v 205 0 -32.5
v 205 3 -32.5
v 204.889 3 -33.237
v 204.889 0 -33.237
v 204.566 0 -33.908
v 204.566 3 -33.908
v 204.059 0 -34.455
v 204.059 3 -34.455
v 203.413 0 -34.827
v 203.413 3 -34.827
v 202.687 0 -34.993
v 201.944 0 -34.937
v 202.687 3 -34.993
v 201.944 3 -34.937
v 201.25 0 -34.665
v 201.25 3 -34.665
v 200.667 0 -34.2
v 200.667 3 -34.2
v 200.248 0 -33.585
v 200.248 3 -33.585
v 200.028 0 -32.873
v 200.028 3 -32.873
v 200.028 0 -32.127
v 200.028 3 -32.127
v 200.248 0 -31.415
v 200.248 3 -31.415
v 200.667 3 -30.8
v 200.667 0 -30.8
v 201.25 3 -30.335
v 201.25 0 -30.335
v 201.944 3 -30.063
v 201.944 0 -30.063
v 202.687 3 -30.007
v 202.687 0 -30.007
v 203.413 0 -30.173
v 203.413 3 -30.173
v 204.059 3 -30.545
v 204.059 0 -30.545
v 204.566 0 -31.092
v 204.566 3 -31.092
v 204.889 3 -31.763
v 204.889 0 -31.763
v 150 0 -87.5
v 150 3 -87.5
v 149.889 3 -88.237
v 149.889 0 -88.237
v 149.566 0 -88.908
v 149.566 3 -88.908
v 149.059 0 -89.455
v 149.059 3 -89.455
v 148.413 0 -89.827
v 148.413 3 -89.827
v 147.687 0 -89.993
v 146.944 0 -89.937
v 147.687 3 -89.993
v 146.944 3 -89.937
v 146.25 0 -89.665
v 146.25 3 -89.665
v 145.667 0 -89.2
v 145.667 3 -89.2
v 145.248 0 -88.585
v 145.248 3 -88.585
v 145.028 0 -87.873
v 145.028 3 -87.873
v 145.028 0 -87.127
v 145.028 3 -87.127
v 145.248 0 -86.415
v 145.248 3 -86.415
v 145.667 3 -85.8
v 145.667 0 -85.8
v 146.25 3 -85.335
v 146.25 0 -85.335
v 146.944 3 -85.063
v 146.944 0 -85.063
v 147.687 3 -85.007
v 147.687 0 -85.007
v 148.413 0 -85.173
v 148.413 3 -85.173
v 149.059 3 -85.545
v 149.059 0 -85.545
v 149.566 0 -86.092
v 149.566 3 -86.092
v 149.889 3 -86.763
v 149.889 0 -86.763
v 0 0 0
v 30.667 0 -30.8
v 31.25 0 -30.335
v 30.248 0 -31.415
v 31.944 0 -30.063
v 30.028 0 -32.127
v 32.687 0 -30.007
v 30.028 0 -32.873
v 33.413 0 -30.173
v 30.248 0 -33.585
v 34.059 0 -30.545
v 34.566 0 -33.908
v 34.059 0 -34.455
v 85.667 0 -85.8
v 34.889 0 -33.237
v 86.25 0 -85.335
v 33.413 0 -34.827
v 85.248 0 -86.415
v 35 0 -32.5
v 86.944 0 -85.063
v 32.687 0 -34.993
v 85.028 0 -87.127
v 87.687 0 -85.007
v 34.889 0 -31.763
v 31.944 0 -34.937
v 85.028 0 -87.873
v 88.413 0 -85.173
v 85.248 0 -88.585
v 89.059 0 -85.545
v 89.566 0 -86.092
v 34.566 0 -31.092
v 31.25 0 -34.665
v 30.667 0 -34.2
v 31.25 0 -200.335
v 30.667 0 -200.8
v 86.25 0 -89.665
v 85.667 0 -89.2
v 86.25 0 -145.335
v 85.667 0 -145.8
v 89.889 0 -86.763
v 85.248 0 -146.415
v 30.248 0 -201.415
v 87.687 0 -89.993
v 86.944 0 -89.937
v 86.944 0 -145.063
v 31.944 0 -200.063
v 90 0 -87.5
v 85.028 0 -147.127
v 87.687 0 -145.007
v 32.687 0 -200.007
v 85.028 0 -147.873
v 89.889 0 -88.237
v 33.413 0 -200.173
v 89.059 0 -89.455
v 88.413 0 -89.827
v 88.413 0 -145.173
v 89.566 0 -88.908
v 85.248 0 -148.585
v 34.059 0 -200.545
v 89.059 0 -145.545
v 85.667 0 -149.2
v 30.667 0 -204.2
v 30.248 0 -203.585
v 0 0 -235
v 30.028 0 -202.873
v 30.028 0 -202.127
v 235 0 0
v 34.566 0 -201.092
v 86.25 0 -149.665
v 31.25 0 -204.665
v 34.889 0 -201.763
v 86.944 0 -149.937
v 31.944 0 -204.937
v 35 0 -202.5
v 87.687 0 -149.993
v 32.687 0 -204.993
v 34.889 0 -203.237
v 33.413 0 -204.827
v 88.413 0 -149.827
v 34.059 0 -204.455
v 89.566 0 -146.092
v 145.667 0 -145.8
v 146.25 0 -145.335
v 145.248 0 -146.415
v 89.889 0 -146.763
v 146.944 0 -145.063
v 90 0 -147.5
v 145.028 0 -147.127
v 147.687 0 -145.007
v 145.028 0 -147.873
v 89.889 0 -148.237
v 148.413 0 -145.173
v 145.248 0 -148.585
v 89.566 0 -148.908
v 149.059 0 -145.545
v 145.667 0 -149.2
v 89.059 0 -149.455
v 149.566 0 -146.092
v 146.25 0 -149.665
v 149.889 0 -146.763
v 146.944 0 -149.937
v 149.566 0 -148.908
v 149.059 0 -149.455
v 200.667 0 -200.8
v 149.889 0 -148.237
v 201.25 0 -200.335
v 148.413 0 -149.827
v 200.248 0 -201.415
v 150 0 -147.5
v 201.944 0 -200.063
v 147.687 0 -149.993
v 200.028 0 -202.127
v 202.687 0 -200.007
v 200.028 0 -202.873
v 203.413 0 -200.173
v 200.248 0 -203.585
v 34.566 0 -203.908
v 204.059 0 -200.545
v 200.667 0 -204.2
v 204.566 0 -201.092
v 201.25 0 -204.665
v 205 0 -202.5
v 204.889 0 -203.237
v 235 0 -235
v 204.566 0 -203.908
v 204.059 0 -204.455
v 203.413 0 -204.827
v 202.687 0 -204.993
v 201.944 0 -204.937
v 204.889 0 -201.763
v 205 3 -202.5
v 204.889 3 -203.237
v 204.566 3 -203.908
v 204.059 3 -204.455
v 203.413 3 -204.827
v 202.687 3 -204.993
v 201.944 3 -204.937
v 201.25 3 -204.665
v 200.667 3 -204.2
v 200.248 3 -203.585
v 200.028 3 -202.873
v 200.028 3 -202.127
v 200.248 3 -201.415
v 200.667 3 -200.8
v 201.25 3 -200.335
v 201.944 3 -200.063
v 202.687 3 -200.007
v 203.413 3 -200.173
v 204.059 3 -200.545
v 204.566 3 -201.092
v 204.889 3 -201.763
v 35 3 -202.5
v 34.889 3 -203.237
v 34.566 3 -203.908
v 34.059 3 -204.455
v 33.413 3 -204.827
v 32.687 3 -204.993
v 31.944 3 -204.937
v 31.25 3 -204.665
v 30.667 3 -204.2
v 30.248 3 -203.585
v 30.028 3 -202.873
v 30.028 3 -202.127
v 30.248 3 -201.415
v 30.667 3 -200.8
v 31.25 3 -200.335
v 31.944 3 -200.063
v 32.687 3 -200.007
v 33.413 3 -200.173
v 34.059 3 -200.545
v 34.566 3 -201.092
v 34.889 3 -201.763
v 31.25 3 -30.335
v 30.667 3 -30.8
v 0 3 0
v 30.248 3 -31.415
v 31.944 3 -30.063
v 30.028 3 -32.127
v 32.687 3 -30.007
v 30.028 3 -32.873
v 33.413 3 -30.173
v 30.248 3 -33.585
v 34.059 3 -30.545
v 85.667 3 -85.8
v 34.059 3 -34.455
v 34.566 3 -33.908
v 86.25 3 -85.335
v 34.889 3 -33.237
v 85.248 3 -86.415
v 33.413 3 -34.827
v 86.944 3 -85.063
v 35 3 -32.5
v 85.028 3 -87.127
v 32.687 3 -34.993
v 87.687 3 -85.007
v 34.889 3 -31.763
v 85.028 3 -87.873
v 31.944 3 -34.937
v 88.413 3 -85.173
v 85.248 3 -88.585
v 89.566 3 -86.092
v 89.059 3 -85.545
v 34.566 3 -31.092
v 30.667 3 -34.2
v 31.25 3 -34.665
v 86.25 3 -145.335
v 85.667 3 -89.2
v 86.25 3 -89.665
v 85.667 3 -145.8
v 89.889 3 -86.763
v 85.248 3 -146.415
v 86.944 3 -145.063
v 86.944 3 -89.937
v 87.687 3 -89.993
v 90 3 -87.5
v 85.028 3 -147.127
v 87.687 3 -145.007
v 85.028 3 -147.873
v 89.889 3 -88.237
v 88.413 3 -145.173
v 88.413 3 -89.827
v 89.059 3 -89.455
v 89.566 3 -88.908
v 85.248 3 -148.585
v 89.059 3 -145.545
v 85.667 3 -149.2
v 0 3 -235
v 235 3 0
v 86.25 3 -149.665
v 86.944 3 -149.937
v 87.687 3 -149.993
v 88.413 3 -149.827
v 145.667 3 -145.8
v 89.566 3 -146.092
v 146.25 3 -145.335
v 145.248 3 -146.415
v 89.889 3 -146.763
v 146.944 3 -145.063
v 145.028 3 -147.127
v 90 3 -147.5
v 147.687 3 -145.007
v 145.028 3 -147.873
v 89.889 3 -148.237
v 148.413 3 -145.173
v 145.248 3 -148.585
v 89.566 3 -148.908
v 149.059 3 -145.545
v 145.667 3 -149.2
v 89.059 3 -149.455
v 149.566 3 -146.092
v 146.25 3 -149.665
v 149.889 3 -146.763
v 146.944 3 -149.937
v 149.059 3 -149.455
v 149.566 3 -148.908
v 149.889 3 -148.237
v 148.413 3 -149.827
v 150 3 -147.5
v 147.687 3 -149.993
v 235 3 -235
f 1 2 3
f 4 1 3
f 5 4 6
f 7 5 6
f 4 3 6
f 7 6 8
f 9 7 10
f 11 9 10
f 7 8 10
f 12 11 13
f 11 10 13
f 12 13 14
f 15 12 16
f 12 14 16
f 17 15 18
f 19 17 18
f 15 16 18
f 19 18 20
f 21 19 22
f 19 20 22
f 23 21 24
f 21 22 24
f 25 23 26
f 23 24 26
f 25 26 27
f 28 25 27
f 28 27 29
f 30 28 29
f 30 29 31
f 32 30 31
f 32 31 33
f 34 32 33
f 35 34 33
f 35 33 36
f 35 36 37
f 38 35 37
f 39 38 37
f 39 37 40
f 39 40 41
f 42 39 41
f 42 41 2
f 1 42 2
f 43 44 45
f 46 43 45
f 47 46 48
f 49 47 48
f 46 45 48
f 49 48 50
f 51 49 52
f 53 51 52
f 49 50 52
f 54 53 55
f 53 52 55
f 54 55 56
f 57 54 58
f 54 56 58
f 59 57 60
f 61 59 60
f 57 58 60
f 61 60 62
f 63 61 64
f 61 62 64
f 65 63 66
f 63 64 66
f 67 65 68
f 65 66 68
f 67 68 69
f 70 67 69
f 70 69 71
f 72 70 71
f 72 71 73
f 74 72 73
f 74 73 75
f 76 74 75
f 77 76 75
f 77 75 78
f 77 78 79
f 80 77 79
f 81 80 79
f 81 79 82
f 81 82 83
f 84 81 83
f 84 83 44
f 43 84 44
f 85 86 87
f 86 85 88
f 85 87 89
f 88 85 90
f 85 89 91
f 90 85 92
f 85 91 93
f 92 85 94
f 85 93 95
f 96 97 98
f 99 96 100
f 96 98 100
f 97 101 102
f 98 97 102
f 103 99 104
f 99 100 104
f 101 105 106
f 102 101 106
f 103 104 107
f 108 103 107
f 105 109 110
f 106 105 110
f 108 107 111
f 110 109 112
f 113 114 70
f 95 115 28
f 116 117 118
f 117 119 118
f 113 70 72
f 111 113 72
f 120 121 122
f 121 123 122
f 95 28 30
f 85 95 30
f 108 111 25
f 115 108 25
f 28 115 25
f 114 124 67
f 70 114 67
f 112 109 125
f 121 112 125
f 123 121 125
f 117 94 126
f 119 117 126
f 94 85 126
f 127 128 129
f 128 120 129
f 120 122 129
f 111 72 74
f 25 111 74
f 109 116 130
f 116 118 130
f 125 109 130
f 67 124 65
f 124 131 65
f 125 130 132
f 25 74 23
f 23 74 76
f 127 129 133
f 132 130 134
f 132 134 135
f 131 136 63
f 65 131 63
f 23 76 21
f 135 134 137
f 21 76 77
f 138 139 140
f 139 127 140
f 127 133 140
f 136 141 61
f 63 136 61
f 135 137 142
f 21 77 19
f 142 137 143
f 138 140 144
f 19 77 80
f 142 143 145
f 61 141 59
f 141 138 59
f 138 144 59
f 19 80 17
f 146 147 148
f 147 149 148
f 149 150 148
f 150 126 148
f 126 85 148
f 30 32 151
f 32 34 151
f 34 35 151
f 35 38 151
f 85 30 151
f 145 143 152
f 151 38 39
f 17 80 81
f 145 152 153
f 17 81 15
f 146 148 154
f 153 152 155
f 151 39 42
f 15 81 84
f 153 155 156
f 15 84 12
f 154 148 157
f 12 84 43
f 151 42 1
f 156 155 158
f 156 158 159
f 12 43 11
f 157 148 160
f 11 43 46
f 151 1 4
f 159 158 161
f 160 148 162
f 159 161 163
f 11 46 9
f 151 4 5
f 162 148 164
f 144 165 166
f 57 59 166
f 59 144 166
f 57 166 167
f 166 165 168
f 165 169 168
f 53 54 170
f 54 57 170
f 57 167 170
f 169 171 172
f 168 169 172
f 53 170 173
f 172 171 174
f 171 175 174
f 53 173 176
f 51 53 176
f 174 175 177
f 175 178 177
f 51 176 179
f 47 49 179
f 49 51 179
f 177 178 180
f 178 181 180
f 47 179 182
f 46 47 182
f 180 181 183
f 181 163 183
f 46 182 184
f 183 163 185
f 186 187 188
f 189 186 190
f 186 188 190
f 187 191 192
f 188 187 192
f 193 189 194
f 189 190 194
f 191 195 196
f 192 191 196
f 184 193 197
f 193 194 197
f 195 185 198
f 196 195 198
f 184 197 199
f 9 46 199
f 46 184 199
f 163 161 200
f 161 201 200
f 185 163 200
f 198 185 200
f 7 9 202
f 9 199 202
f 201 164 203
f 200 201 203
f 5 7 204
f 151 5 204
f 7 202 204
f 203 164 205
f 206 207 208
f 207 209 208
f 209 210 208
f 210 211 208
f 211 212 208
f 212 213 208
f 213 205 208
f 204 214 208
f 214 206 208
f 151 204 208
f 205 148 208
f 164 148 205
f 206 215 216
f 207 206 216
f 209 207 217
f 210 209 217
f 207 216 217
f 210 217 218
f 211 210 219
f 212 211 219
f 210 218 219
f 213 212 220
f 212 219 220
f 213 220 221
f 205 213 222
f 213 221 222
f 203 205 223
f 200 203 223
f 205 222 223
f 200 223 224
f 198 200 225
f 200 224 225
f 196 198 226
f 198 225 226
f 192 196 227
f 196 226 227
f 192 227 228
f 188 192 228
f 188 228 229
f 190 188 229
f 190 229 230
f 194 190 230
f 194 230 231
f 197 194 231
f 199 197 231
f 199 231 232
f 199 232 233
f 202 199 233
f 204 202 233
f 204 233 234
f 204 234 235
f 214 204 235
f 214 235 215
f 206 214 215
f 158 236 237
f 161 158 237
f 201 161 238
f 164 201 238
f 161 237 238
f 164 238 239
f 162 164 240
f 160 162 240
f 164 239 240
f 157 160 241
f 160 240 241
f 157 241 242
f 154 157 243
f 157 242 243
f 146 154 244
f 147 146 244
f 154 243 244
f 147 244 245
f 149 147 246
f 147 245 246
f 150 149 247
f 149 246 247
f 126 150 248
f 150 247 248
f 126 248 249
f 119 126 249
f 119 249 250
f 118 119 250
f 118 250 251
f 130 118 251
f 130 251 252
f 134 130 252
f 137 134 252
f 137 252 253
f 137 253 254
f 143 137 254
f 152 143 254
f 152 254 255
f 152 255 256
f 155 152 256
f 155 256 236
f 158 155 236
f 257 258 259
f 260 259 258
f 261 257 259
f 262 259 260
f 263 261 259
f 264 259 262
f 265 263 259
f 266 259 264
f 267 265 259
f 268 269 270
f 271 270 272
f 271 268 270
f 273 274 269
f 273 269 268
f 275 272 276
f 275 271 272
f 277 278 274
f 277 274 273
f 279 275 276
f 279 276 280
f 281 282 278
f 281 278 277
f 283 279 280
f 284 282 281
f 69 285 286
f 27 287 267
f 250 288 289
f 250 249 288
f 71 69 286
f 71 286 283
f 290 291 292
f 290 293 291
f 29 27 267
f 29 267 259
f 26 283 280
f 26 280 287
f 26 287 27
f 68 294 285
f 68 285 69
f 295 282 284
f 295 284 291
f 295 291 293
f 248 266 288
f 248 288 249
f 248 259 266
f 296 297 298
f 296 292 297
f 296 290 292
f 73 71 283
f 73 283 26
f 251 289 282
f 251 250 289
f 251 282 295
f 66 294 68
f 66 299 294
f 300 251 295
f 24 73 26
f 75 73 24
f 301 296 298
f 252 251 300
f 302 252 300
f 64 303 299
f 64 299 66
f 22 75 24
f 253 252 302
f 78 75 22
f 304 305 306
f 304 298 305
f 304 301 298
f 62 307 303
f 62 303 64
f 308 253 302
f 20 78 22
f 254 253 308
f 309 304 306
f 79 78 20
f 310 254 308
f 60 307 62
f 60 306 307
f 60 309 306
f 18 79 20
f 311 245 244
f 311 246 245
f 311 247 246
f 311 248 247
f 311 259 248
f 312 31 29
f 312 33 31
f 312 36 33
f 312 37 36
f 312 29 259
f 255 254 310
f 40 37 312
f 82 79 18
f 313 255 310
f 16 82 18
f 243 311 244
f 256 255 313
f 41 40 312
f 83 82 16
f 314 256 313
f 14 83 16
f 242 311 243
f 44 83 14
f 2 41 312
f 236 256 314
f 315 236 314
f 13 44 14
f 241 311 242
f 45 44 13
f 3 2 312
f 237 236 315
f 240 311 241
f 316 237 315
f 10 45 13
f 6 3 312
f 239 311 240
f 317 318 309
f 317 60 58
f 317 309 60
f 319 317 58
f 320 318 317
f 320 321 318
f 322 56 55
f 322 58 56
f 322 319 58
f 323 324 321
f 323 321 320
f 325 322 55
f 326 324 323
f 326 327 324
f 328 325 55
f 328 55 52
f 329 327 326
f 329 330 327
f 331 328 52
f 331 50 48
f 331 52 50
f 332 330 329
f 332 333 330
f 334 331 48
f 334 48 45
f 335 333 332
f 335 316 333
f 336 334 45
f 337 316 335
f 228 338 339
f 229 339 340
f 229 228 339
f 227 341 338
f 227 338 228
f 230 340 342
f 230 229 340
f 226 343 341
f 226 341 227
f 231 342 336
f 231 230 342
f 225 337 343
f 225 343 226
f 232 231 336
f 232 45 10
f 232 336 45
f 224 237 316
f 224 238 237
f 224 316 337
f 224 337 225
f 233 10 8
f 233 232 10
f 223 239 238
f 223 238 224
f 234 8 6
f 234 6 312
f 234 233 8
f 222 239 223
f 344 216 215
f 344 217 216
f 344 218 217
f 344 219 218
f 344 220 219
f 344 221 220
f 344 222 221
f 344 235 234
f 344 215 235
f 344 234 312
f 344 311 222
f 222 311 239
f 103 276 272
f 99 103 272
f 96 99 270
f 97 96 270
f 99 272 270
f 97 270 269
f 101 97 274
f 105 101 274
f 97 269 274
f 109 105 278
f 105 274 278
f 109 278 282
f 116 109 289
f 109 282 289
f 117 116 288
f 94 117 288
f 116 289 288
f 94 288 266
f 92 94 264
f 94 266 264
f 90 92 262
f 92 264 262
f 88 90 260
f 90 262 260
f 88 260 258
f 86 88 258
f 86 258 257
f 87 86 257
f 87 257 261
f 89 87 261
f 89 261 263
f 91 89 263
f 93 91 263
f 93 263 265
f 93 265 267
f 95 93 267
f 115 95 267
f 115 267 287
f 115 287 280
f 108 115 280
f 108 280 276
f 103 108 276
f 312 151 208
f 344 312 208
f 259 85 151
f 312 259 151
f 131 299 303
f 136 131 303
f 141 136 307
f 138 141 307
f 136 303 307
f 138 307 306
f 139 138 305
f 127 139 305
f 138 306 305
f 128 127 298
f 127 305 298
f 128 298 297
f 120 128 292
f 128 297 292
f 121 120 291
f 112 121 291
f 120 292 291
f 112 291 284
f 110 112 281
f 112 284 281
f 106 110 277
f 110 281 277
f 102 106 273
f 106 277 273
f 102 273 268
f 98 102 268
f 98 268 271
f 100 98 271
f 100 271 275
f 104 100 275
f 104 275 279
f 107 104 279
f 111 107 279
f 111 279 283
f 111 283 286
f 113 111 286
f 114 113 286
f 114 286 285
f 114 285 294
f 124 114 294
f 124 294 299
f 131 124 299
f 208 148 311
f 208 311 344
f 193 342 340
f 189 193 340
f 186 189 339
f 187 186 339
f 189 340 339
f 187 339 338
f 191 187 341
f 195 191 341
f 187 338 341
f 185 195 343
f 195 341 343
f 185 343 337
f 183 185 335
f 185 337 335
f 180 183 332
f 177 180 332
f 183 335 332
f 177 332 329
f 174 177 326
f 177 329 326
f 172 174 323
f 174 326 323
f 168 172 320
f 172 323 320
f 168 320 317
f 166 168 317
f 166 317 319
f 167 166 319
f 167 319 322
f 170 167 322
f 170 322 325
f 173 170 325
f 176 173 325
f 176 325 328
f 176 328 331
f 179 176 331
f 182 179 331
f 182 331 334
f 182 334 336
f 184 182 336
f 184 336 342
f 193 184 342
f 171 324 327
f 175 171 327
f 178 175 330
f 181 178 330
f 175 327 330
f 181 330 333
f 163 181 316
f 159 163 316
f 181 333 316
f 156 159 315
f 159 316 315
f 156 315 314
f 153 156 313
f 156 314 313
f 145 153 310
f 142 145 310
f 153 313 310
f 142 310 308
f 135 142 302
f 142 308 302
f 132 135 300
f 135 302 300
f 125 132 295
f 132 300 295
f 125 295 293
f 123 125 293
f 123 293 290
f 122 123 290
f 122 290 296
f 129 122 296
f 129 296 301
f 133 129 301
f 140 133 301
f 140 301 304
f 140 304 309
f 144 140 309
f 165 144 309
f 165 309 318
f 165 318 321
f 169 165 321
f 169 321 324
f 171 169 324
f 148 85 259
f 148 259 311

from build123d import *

# Parameters (mm, degrees)
SKETCH1_W           = 235
SKETCH1_H           = 235
BOSS_EXTRUDE1_DEPTH = 3
CUT_EXTRUDE1_REACH  = 5
SKETCH2_R           = 2.5


with BuildPart() as part:
    # Sketch1 → Boss-Extrude1 (new body)
    with BuildSketch(Plane(origin=(0, 0, 0), x_dir=(1, 0, 0), z_dir=(0, 1, 0))):
        with Locations((117.5, 117.5)):
            Rectangle(SKETCH1_W, SKETCH1_H)
    extrude(amount=BOSS_EXTRUDE1_DEPTH)

    # Sketch2 → Cut-Extrude1 (cut, up to next)
    with BuildSketch(Plane(origin=(0, 3, 0), x_dir=(1, 0, 0), z_dir=(0, 1, 0)), mode=Mode.PRIVATE) as cut_extrude1_sk1:
        with Locations((32.5, 202.5)):
            Circle(SKETCH2_R)
    cut_extrude1_tool1 = extrude(cut_extrude1_sk1.sketch, amount=-CUT_EXTRUDE1_REACH, mode=Mode.PRIVATE) & part.part
    add(cut_extrude1_tool1.solids().sort_by_distance((32.5, 3, -202.5))[0], mode=Mode.SUBTRACT)
    # Sketch2 → Cut-Extrude1 (cut, up to next)
    with BuildSketch(Plane(origin=(0, 3, 0), x_dir=(1, 0, 0), z_dir=(0, 1, 0)), mode=Mode.PRIVATE) as cut_extrude1_sk2:
        with Locations((202.5, 202.5)):
            Circle(SKETCH2_R)
    cut_extrude1_tool2 = extrude(cut_extrude1_sk2.sketch, amount=-CUT_EXTRUDE1_REACH, mode=Mode.PRIVATE) & part.part
    add(cut_extrude1_tool2.solids().sort_by_distance((202.5, 3, -202.5))[0], mode=Mode.SUBTRACT)
    # Sketch2 → Cut-Extrude1 (cut, up to next)
    with BuildSketch(Plane(origin=(0, 3, 0), x_dir=(1, 0, 0), z_dir=(0, 1, 0)), mode=Mode.PRIVATE) as cut_extrude1_sk3:
        with Locations((202.5, 32.5)):
            Circle(SKETCH2_R)
    cut_extrude1_tool3 = extrude(cut_extrude1_sk3.sketch, amount=-CUT_EXTRUDE1_REACH, mode=Mode.PRIVATE) & part.part
    add(cut_extrude1_tool3.solids().sort_by_distance((202.5, 3, -32.5))[0], mode=Mode.SUBTRACT)
    # Sketch2 → Cut-Extrude1 (cut, up to next)
    with BuildSketch(Plane(origin=(0, 3, 0), x_dir=(1, 0, 0), z_dir=(0, 1, 0)), mode=Mode.PRIVATE) as cut_extrude1_sk4:
        with Locations((32.5, 32.5)):
            Circle(SKETCH2_R)
    cut_extrude1_tool4 = extrude(cut_extrude1_sk4.sketch, amount=-CUT_EXTRUDE1_REACH, mode=Mode.PRIVATE) & part.part
    add(cut_extrude1_tool4.solids().sort_by_distance((32.5, 3, -32.5))[0], mode=Mode.SUBTRACT)
    # Sketch2 → Cut-Extrude1 (cut, up to next)
    with BuildSketch(Plane(origin=(0, 3, 0), x_dir=(1, 0, 0), z_dir=(0, 1, 0)), mode=Mode.PRIVATE) as cut_extrude1_sk5:
        with Locations((87.5, 147.5)):
            Circle(SKETCH2_R)
    cut_extrude1_tool5 = extrude(cut_extrude1_sk5.sketch, amount=-CUT_EXTRUDE1_REACH, mode=Mode.PRIVATE) & part.part
    add(cut_extrude1_tool5.solids().sort_by_distance((87.5, 3, -147.5))[0], mode=Mode.SUBTRACT)
    # Sketch2 → Cut-Extrude1 (cut, up to next)
    with BuildSketch(Plane(origin=(0, 3, 0), x_dir=(1, 0, 0), z_dir=(0, 1, 0)), mode=Mode.PRIVATE) as cut_extrude1_sk6:
        with Locations((147.5, 147.5)):
            Circle(SKETCH2_R)
    cut_extrude1_tool6 = extrude(cut_extrude1_sk6.sketch, amount=-CUT_EXTRUDE1_REACH, mode=Mode.PRIVATE) & part.part
    add(cut_extrude1_tool6.solids().sort_by_distance((147.5, 3, -147.5))[0], mode=Mode.SUBTRACT)
    # Sketch2 → Cut-Extrude1 (cut, up to next)
    with BuildSketch(Plane(origin=(0, 3, 0), x_dir=(1, 0, 0), z_dir=(0, 1, 0)), mode=Mode.PRIVATE) as cut_extrude1_sk7:
        with Locations((147.5, 87.5)):
            Circle(SKETCH2_R)
    cut_extrude1_tool7 = extrude(cut_extrude1_sk7.sketch, amount=-CUT_EXTRUDE1_REACH, mode=Mode.PRIVATE) & part.part
    add(cut_extrude1_tool7.solids().sort_by_distance((147.5, 3, -87.5))[0], mode=Mode.SUBTRACT)
    # Sketch2 → Cut-Extrude1 (cut, up to next)
    with BuildSketch(Plane(origin=(0, 3, 0), x_dir=(1, 0, 0), z_dir=(0, 1, 0)), mode=Mode.PRIVATE) as cut_extrude1_sk8:
        with Locations((87.5, 87.5)):
            Circle(SKETCH2_R)
    cut_extrude1_tool8 = extrude(cut_extrude1_sk8.sketch, amount=-CUT_EXTRUDE1_REACH, mode=Mode.PRIVATE) & part.part
    add(cut_extrude1_tool8.solids().sort_by_distance((87.5, 3, -87.5))[0], mode=Mode.SUBTRACT)


solid = part.part
